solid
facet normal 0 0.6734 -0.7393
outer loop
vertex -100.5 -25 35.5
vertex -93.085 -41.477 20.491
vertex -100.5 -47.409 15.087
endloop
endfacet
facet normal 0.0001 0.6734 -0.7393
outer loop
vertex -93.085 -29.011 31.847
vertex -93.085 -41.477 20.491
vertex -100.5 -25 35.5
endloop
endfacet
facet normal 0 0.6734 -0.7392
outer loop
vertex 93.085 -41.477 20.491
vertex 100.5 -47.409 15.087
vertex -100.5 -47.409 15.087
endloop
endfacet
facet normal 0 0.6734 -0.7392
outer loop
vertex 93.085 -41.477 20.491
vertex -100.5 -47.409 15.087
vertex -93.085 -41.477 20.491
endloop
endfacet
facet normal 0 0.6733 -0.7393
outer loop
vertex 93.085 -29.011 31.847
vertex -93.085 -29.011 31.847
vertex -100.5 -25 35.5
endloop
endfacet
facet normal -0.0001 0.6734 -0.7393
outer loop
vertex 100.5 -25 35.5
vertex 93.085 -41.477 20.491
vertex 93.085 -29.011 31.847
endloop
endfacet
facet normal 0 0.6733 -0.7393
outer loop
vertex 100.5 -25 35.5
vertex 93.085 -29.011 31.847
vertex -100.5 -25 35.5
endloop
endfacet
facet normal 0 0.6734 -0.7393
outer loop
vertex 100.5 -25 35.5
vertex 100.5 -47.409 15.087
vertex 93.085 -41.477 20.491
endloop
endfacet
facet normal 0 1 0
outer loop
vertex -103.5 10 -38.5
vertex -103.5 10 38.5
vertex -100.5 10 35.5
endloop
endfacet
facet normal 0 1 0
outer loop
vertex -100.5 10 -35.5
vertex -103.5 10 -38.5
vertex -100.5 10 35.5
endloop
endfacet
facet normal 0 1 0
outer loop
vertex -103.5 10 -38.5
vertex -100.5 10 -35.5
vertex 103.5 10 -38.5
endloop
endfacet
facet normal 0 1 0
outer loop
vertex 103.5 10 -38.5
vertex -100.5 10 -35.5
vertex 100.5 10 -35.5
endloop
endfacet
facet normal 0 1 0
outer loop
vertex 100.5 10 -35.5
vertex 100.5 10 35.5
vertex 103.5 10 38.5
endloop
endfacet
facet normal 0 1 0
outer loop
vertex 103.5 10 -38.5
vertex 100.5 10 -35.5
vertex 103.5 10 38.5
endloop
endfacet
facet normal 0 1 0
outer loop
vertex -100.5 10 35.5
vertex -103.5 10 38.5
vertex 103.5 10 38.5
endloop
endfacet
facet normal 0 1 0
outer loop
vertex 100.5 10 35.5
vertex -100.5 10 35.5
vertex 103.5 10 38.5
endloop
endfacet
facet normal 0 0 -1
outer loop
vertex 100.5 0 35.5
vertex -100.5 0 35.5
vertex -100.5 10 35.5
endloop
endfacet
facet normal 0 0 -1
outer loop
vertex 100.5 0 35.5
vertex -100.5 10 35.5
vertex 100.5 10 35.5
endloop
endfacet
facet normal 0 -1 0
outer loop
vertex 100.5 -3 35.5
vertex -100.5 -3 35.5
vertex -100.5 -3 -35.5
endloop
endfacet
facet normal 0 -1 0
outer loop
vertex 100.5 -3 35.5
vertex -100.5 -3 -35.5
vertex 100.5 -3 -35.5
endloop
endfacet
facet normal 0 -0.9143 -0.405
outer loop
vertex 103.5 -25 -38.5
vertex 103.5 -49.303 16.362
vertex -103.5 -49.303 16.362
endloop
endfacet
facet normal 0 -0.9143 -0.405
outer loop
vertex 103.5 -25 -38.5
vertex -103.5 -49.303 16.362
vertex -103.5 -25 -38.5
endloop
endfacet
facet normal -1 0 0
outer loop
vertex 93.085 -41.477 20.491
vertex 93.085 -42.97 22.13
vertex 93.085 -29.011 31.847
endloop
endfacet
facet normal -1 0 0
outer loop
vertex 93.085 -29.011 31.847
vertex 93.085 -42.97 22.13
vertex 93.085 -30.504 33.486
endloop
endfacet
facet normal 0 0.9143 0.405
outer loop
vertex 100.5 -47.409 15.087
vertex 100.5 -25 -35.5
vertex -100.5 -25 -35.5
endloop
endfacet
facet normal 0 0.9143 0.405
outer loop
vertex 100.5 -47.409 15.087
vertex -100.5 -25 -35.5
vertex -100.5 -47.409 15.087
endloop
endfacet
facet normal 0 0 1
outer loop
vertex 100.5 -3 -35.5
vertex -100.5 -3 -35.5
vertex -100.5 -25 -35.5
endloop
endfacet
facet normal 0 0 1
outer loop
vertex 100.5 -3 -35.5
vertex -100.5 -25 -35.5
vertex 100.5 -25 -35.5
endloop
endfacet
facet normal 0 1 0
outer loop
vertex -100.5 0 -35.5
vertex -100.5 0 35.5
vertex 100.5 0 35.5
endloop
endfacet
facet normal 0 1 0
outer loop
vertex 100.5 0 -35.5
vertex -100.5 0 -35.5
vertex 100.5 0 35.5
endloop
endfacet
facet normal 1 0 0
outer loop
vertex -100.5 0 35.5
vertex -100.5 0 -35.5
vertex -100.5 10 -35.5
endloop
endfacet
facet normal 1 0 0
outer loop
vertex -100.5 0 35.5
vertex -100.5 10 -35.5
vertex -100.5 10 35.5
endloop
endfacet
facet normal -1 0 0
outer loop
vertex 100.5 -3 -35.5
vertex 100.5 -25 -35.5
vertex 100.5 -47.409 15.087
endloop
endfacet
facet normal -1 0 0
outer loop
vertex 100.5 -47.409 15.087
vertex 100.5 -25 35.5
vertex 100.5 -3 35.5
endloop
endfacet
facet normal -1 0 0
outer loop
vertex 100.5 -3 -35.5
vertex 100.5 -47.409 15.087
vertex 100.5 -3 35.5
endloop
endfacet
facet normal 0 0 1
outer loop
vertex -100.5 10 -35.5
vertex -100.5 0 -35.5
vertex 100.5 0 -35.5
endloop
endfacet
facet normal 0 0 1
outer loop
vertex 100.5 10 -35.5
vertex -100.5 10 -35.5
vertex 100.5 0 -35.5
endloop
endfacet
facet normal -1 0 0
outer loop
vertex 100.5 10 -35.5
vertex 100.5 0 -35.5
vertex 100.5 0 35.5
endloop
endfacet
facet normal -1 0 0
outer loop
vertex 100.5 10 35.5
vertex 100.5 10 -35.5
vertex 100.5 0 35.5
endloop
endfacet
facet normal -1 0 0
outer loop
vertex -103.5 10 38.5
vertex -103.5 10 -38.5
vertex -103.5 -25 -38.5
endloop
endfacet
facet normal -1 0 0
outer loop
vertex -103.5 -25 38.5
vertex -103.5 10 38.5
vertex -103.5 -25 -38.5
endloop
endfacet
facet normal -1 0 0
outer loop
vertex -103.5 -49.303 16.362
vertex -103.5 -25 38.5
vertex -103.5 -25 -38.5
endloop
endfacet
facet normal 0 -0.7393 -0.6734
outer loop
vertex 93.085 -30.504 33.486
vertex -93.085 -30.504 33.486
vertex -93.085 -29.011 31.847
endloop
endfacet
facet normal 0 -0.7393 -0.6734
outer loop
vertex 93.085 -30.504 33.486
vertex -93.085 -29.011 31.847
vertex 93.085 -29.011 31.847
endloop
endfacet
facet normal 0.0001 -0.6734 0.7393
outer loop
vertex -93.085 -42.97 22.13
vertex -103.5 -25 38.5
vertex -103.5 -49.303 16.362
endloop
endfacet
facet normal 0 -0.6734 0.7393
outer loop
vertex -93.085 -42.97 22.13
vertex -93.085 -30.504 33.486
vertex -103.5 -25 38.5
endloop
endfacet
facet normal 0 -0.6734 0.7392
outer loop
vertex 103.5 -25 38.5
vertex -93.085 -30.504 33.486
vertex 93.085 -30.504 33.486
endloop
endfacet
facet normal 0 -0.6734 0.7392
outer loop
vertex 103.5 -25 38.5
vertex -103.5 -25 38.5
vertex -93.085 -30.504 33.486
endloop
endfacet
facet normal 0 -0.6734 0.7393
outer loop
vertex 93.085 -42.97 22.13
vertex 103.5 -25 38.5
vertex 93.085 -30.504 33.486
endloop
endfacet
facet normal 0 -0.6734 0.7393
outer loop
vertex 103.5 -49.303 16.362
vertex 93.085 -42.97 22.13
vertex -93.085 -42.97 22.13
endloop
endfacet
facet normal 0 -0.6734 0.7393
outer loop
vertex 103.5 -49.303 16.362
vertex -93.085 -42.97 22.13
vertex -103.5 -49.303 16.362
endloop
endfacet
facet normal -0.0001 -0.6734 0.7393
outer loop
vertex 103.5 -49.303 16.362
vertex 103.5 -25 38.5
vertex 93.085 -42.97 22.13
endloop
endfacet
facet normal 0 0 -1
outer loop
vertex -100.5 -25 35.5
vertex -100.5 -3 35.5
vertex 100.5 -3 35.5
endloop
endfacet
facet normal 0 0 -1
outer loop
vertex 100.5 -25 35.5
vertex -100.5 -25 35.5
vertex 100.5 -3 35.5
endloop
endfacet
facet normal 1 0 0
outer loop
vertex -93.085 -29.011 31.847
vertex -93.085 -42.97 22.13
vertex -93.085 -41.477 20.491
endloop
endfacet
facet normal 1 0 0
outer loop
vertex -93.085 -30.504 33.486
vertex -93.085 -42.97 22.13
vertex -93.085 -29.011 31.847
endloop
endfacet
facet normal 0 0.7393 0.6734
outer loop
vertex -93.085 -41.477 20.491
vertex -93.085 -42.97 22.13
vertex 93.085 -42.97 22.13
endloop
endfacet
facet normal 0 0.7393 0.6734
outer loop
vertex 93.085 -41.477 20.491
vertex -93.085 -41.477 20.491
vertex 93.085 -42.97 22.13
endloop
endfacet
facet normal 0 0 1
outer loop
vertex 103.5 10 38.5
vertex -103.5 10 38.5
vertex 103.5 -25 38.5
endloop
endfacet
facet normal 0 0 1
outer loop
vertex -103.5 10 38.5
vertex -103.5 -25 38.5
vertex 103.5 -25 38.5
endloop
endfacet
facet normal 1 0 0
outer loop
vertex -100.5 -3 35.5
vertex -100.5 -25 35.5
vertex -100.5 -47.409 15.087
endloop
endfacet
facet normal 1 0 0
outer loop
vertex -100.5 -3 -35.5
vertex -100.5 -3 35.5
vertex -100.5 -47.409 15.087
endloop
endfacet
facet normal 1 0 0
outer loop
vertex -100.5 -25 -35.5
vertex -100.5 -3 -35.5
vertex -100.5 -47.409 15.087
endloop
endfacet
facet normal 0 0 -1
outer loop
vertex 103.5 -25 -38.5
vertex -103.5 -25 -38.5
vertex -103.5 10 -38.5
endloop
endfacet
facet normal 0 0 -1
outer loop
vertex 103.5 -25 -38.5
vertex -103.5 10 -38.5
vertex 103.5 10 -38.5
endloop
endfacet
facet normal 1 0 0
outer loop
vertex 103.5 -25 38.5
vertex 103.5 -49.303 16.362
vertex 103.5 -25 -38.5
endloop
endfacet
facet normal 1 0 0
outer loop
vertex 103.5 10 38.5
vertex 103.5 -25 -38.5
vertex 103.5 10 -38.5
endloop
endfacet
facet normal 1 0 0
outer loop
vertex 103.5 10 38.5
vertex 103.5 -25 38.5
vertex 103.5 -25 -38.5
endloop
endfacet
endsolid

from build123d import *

# Parameters (mm, degrees)
F0_W          = 201
F0_H          = 71
F1_DEPTH      = 3
F0_W_2        = 207
F0_H_2        = 77
F2_DEPTH      = 25
F2_DEPTH_BACK = 10
F4_DEPTH      = 3
F5_DEPTH      = 207
F7_DEPTH      = 3
F8_W          = 186.1692070961
F8_H          = 16.862899065
F9_DEPTH      = 2.2177692789


with BuildPart() as f1:
    # F0 (on Front) → F1 (new body)
    with BuildSketch(Plane.XZ):
        Rectangle(F0_W, F0_H)
    extrude(amount=F1_DEPTH)

    # F0 (on Front) → F2 (join, two sides)
    with BuildSketch(Plane.XZ) as f2_sk:
        Rectangle(F0_W_2, F0_H_2)
        Rectangle(F0_W, F0_H, mode=Mode.SUBTRACT)
    extrude(amount=F2_DEPTH)
    extrude(f2_sk.sketch, amount=-F2_DEPTH_BACK)

    # F3 (on face) → F4 (join, through all)
    with BuildSketch(Plane.YZ.offset(103.5)):
        Polygon((-47.4088080227, 15.086744912), (-25, -35.5), (-25, 35.5), align=None)
        Polygon((-49.3025101092, 16.3616811017), (-25, -38.5), (-25, -35.5), (-47.4088080227, 15.086744912), (-25, 35.5), (-25, 38.5), align=None)
    extrude(amount=-F4_DEPTH)

    # F3 (on face) → F5 (join, through all)
    with BuildSketch(Plane.YZ.offset(103.5)):
        Polygon((-49.3025101092, 16.3616811017), (-25, -38.5), (-25, -35.5), (-47.4088080227, 15.086744912), (-25, 35.5), (-25, 38.5), align=None)
    extrude(amount=-F5_DEPTH)

    # F6 (on face) → F7 (join, through all)
    with BuildSketch(Plane(origin=(-103.5, 0, 0), x_dir=(0, -1, 0), z_dir=(-1, 0, 0))):
        Polygon((25, 35.5), (25, -35.5), (47.4088080227, 15.086744912), align=None)
    extrude(amount=-F7_DEPTH)

    # F8 (on face) → F9 (cut, through all)
    with BuildSketch(Plane(origin=(0, -30.504070767, 33.4860786671), x_dir=(1, 0, 0), z_dir=(0, -0.6734240389, 0.7392564263))):
        with Locations((0, -8.4314495325)):
            Rectangle(F8_W, F8_H)
    extrude(amount=-F9_DEPTH, mode=Mode.SUBTRACT)


solid = f1.part
